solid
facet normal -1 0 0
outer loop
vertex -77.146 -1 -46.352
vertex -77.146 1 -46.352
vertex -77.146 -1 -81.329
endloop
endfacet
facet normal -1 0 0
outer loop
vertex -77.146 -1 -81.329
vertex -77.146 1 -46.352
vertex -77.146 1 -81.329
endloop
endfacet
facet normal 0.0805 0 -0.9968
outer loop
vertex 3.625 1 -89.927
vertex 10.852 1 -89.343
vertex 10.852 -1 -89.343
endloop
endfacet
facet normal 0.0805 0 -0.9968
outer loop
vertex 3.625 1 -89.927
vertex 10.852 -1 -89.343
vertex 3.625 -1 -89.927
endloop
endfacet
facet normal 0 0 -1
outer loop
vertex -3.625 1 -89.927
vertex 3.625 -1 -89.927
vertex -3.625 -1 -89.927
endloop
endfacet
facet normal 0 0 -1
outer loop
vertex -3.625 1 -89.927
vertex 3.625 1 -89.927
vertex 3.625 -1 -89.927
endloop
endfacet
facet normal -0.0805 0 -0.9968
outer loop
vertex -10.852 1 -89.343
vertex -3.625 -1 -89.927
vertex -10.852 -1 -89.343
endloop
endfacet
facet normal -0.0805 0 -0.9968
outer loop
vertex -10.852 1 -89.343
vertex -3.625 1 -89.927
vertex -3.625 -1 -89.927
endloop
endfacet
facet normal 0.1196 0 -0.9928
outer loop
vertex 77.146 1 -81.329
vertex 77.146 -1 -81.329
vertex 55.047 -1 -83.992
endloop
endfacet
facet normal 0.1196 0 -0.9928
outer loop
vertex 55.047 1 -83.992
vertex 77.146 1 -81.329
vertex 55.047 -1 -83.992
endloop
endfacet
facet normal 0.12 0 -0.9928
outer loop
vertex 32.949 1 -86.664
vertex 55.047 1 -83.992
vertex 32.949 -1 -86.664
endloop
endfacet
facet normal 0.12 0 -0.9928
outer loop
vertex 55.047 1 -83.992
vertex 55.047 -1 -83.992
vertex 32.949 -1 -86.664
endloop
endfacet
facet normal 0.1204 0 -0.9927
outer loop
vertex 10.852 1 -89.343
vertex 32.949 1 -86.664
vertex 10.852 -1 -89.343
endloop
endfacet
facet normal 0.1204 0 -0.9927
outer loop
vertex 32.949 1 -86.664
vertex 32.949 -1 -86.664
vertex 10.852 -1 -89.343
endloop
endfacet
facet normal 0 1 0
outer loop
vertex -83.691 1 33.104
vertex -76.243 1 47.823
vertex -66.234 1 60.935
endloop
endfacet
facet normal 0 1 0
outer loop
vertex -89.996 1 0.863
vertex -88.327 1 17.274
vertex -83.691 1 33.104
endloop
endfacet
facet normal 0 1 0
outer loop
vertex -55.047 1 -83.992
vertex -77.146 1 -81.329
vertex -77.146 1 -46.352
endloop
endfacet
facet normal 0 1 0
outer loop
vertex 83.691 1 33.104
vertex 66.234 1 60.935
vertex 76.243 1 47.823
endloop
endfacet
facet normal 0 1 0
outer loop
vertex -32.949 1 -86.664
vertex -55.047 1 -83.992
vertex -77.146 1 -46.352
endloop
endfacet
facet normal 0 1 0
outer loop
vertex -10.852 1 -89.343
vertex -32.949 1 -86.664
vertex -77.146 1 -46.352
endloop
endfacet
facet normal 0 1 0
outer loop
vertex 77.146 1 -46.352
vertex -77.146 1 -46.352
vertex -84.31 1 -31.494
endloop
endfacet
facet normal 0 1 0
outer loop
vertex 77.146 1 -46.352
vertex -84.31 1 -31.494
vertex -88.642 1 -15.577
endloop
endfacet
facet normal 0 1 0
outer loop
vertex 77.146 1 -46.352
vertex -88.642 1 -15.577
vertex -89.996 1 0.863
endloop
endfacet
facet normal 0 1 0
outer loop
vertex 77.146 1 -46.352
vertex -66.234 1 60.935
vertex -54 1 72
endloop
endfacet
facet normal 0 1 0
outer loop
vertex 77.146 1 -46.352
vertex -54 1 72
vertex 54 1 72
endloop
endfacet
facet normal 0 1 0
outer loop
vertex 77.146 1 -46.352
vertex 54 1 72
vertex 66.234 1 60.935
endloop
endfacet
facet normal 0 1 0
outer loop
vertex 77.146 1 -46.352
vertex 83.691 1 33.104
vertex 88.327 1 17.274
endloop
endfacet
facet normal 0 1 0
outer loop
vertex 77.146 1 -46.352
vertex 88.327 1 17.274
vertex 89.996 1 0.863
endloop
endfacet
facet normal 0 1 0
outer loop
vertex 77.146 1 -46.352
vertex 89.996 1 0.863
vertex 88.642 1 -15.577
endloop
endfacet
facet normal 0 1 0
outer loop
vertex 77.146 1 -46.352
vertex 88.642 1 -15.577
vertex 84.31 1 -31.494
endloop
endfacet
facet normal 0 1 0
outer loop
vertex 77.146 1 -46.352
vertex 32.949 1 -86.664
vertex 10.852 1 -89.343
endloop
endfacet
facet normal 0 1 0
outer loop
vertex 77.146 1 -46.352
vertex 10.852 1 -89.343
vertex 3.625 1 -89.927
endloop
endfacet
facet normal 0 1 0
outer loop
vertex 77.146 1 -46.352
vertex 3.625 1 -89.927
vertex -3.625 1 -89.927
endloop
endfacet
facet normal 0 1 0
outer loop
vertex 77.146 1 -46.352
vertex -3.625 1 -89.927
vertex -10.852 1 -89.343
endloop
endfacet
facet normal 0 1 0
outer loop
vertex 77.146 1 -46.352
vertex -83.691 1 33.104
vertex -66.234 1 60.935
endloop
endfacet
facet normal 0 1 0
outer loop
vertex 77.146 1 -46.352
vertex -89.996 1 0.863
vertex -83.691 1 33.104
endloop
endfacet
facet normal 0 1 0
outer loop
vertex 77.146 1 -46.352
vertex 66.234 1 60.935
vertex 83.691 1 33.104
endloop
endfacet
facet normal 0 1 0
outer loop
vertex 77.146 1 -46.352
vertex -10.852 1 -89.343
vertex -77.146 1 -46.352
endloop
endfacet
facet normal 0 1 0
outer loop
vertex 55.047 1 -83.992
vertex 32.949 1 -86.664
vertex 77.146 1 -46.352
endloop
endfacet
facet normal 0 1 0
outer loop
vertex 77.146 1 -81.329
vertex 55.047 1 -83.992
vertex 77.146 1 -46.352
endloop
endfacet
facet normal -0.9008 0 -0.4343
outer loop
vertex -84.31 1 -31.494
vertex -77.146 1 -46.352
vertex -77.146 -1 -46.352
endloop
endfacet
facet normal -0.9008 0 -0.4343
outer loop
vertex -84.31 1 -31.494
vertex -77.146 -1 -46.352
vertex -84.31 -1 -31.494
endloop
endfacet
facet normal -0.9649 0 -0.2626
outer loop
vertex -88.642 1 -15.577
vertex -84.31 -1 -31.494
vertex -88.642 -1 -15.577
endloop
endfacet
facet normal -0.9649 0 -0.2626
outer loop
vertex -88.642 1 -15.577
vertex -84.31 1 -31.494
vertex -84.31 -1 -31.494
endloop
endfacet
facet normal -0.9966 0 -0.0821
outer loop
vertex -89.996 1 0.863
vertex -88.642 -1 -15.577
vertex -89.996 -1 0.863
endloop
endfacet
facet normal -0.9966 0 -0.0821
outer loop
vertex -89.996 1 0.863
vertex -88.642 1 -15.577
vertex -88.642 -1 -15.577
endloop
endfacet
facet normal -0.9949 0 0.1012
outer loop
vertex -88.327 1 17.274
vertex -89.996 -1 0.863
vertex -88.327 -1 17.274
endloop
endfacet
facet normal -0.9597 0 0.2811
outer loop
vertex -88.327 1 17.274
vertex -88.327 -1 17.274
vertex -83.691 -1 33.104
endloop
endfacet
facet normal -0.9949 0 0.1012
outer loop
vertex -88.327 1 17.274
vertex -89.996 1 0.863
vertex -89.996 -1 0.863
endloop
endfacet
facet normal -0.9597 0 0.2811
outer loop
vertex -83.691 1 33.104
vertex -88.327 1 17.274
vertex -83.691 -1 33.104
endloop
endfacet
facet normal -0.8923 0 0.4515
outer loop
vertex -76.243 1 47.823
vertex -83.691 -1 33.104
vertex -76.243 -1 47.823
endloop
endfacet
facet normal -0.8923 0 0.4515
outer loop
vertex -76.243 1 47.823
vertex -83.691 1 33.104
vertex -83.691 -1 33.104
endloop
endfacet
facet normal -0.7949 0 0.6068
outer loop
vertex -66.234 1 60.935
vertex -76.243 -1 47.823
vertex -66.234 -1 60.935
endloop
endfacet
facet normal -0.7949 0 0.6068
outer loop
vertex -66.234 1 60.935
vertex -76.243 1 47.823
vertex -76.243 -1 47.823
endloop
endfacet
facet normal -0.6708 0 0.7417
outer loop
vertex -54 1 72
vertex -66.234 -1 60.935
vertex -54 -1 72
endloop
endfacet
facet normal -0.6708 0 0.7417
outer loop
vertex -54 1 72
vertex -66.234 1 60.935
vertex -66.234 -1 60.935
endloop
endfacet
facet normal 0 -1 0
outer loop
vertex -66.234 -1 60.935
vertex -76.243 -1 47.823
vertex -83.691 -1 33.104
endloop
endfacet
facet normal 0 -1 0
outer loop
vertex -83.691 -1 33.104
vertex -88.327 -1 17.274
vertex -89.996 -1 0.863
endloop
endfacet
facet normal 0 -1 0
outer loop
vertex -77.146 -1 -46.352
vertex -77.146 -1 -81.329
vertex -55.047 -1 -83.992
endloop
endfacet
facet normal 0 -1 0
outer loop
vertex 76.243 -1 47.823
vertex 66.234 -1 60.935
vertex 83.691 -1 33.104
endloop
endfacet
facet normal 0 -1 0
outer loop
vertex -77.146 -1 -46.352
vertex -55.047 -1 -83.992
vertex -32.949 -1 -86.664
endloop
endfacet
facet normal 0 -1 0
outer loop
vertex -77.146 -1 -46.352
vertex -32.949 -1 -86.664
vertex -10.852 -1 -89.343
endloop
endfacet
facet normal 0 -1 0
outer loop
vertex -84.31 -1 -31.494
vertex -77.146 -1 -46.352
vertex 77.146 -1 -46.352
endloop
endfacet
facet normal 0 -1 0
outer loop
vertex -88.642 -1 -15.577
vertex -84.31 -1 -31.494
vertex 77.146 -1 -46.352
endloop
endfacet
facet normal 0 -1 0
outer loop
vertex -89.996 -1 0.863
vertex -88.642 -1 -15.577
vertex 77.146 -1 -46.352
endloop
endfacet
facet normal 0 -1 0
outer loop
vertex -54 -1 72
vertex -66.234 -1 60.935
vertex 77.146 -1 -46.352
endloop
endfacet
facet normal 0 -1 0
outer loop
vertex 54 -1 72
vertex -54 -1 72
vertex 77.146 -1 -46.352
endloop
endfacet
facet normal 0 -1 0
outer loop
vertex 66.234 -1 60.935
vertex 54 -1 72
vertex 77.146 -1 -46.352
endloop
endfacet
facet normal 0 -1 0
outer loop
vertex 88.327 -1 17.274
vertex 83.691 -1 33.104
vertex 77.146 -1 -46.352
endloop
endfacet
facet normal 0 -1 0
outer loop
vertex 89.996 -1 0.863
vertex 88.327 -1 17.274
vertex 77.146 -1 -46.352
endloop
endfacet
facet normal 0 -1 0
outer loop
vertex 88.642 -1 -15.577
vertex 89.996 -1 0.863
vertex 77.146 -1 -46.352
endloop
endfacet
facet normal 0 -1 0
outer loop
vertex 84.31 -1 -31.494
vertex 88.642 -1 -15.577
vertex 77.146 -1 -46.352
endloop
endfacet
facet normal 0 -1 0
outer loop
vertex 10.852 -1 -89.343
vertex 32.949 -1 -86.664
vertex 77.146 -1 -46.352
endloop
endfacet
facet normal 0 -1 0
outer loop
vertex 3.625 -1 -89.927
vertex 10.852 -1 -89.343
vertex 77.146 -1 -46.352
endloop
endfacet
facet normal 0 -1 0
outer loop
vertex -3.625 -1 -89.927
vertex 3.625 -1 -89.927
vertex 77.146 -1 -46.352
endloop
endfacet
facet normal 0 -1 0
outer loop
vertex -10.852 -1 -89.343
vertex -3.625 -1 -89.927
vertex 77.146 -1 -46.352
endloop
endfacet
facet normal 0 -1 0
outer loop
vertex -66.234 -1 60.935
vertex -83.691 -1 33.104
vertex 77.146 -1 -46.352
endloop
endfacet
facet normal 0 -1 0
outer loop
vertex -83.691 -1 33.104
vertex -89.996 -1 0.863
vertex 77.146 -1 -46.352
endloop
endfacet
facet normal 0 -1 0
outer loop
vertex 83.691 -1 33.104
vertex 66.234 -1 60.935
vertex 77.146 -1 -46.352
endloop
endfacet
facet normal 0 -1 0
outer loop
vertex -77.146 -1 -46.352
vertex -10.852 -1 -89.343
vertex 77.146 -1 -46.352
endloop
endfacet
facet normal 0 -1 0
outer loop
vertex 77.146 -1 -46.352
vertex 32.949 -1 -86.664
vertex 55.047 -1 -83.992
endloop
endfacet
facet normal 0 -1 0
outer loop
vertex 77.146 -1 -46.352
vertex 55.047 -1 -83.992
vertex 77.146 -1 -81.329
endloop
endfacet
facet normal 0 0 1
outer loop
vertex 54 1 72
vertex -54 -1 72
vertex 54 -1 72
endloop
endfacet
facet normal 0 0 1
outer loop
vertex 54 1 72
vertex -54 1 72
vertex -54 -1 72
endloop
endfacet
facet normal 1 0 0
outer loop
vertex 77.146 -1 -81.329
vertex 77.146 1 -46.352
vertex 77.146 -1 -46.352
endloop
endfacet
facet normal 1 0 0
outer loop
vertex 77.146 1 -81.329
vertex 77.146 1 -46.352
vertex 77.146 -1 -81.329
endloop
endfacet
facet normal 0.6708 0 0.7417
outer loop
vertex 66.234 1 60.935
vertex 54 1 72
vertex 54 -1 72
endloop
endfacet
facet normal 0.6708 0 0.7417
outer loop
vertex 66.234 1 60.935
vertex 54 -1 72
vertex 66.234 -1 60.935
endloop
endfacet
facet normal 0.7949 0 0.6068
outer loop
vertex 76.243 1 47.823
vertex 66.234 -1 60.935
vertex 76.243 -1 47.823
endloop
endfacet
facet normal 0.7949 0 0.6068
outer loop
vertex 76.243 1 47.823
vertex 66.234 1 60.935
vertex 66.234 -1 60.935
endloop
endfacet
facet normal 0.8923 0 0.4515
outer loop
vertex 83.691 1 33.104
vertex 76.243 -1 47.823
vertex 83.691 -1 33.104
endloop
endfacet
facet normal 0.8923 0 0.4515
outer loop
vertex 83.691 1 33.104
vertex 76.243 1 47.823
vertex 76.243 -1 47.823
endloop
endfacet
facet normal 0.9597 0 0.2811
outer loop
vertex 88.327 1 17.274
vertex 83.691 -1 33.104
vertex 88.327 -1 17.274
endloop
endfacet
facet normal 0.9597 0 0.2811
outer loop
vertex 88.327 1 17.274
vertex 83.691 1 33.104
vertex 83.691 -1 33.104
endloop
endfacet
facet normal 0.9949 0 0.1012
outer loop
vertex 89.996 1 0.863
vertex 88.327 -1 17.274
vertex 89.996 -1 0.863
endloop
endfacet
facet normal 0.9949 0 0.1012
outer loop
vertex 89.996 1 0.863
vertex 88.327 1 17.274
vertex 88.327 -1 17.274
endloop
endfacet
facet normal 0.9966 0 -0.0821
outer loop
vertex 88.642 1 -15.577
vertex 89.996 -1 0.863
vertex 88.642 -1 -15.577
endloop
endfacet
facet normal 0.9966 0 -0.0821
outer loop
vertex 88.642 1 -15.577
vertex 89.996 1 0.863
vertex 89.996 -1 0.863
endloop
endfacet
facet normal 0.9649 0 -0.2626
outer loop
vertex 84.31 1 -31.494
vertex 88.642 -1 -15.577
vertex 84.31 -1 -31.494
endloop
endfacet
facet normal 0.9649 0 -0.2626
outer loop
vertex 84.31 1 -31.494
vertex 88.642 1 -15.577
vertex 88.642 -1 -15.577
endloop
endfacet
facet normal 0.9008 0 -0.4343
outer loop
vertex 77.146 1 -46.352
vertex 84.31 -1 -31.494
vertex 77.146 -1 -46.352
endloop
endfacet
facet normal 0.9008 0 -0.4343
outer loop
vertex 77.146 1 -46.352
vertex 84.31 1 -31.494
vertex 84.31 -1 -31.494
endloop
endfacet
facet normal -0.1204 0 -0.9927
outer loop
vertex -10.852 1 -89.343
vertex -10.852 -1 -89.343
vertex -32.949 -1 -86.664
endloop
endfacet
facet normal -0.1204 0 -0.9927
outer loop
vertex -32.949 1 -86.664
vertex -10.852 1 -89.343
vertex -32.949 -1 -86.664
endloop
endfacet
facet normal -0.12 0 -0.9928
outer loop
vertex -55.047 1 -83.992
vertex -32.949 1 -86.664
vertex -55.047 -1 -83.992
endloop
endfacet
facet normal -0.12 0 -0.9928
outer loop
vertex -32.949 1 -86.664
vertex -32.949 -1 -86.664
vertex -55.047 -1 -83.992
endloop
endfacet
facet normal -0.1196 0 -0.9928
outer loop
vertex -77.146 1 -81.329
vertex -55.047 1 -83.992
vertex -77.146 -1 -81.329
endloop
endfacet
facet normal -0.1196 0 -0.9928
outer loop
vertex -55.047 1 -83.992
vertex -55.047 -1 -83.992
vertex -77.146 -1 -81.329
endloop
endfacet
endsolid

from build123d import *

# Parameters (mm, degrees)
BOSS_EXTRUDE2_DEPTH = 1
MOTOR_SPACING_W     = 154.291365686
MOTOR_SPACING_H     = 35
BOSS_EXTRUDE6_DEPTH = 2
FILLET4_START       = -1
FILLET4_DEPTH       = 2


with BuildPart() as part:
    # Top_lay → Boss-Extrude2 (new, symmetric)
    with BuildSketch(Plane(origin=(0, 0, 0), x_dir=(1, 0, 0), z_dir=(0, 1, 0))):
        with BuildLine():
            Line((-54, -72), (54, -72))
            ThreePointArc((54, -72), (0, 90), (-54, -72))
        make_face()
    extrude(amount=BOSS_EXTRUDE2_DEPTH, both=True)

    # Motor_Spacing → Boss-Extrude6 (add)
    with BuildSketch(Plane(origin=(0, 1, 0), x_dir=(1, 0, 0), z_dir=(0, 1, 0))):
        with Locations((0, 63.828780022)):
            Rectangle(MOTOR_SPACING_W, MOTOR_SPACING_H)
    extrude(amount=-BOSS_EXTRUDE6_DEPTH)

    # Fillet4: read off the stored shape, not the designer's step
    # Fillet4 outline → Fillet4 (add)
    with BuildSketch(Plane(origin=(0, 0, 0), x_dir=(1, 0, 0), z_dir=(0, 1, 0)).offset(FILLET4_START)):
        with BuildLine():
            ThreePointArc((-38.543865143, 81.328780022), (-25.0207268, 86.452086328), (-10.85161032, 89.34339681))
            ThreePointArc((-10.85161032, 89.34339681), (-43.997531602, 85.326865697), (-77.145682843, 81.328780022))
            Line((-77.145682843, 81.328780022), (-38.543865143, 81.328780022))
        make_face()
        with BuildLine():
            ThreePointArc((77.145682843, 81.328780022), (43.997531602, 85.326865697), (10.85161032, 89.34339681))
            ThreePointArc((10.85161032, 89.34339681), (25.0207268, 86.452086328), (38.543865143, 81.328780022))
            Line((38.543865143, 81.328780022), (77.145682843, 81.328780022))
        make_face()
    extrude(amount=FILLET4_DEPTH)


solid = part.part
